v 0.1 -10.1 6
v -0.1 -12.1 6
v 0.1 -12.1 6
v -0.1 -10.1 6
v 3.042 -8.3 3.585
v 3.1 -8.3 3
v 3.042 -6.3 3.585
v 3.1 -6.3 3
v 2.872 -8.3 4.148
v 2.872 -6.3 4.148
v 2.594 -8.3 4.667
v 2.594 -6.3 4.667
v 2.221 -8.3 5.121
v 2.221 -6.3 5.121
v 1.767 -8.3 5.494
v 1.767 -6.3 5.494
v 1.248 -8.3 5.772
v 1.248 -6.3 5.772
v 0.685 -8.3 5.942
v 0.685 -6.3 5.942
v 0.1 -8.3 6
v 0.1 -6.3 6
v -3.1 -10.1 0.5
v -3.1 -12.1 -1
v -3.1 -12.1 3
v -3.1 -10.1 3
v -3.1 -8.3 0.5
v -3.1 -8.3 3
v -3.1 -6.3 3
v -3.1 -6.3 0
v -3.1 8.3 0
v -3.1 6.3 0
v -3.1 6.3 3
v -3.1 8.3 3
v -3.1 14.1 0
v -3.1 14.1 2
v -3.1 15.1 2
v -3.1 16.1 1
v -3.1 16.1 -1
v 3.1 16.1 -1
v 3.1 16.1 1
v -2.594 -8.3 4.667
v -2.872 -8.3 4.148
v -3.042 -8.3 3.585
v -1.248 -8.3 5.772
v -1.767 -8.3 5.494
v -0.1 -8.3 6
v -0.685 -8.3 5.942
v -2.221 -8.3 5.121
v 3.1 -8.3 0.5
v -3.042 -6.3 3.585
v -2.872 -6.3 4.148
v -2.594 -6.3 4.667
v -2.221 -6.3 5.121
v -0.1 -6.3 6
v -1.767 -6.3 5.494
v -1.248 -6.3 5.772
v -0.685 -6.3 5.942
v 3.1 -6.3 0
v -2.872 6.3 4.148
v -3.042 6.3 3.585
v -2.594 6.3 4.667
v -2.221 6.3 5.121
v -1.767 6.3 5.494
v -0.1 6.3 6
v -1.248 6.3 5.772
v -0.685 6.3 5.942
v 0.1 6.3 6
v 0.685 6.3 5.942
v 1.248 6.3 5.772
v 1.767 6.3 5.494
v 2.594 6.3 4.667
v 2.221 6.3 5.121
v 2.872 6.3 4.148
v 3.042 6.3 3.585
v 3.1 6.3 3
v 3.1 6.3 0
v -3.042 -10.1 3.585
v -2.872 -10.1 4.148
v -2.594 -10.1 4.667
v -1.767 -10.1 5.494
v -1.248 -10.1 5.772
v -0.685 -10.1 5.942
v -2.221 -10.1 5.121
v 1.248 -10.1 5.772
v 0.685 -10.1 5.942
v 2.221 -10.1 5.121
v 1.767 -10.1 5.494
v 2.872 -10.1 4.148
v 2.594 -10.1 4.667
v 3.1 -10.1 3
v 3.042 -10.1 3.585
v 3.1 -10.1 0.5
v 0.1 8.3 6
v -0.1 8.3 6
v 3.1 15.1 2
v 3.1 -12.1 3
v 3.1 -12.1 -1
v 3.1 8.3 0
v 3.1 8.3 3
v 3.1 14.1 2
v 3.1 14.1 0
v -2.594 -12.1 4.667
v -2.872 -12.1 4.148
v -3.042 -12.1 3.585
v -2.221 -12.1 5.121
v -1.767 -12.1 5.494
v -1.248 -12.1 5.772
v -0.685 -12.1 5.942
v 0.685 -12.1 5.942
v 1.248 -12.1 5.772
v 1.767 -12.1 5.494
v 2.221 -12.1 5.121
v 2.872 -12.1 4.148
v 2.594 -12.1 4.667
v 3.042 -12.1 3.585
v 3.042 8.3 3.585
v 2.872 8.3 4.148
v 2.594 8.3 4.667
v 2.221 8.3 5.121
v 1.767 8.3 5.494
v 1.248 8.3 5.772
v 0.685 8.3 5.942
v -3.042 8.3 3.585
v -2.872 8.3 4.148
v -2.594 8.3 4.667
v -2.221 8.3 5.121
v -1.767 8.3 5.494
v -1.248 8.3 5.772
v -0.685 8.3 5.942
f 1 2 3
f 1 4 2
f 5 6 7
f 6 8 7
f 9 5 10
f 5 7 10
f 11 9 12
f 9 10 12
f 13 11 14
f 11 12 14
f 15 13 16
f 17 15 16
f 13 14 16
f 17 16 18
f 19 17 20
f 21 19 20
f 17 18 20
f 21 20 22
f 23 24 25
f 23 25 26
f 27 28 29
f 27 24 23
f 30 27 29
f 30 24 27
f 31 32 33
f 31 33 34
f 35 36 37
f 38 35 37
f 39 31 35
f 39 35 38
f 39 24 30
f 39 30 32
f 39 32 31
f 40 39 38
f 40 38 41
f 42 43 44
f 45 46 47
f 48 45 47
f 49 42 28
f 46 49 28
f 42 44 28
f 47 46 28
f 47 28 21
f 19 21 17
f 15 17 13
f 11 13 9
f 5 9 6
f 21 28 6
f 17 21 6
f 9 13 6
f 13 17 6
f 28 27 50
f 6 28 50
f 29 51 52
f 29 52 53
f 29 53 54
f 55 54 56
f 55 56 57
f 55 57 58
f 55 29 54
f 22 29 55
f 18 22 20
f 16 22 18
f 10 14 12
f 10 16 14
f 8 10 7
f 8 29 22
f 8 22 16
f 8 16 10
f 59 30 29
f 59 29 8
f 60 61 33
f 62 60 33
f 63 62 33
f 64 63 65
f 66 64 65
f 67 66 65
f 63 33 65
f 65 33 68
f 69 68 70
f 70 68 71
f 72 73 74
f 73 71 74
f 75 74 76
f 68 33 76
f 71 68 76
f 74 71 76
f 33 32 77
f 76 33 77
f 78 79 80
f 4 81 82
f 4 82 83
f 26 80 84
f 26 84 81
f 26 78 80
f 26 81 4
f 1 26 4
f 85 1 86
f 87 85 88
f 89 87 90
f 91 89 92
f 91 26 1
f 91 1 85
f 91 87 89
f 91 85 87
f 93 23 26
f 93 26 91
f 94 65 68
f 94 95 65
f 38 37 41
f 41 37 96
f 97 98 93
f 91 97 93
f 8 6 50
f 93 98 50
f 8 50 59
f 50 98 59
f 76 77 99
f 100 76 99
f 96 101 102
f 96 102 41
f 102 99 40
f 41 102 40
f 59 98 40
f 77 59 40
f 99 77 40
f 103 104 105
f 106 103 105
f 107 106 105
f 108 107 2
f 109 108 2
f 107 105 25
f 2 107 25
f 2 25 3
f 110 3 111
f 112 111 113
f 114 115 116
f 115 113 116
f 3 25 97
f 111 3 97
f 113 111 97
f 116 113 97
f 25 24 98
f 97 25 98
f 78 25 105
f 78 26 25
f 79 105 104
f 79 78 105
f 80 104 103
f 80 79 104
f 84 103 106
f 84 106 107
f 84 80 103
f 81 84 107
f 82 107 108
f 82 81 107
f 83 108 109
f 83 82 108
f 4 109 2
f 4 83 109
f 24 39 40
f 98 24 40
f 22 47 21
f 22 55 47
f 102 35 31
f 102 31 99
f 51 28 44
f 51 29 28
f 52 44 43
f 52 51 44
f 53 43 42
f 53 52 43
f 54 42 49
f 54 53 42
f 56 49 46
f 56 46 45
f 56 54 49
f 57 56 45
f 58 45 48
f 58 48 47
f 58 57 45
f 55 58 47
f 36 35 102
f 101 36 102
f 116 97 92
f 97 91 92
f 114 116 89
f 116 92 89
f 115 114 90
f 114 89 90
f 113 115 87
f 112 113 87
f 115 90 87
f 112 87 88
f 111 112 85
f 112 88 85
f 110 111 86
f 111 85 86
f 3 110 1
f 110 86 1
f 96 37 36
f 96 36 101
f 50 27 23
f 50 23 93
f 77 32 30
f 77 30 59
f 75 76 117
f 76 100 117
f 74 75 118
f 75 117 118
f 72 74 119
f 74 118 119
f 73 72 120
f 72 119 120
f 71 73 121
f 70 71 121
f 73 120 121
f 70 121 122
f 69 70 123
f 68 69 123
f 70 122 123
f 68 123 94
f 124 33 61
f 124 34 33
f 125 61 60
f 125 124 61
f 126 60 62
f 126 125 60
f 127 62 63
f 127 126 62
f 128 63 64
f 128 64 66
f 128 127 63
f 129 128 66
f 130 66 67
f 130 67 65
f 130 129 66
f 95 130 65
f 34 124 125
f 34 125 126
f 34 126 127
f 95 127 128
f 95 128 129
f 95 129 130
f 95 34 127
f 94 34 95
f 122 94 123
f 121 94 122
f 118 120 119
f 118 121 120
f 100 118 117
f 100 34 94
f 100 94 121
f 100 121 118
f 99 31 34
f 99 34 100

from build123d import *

# Parameters (mm, degrees)
F0_W     = 6.2
F0_H     = 2
F0_H_2   = 12.6
F0_H_3   = 1.8
F0_H_4   = 5.8
F1_DEPTH = 1
F2_DEPTH = 6
F3_R     = 3
F4_DEPTH = 0.5
F5_DEPTH = 2
F6_SIZE  = 1


with BuildPart() as f1:
    # F0 (on Top) → F1 (new body)
    with BuildSketch(Plane.XY):
        with Locations((0, 15.1)):
            Rectangle(F0_W, F0_H)
        with Locations((0, -11.1)):
            Rectangle(F0_W, F0_H)
        Rectangle(F0_W, F0_H_2)
        with Locations((0, -7.3)):
            Rectangle(F0_W, F0_H)
        with Locations((0, -9.2)):
            Rectangle(F0_W, F0_H_3)
        with Locations((0, 7.3)):
            Rectangle(F0_W, F0_H)
        with Locations((0, 11.2)):
            Rectangle(F0_W, F0_H_4)
    extrude(amount=-F1_DEPTH)

    # F0 (on Top) → F2 (join)
    with BuildSketch(Plane.XY):
        with Locations((0, 7.3)):
            Rectangle(F0_W, F0_H)
        with Locations((0, -7.3)):
            Rectangle(F0_W, F0_H)
        with Locations((0, -11.1)):
            Rectangle(F0_W, F0_H)
    extrude(amount=F2_DEPTH)

    # F3
    f3_edges = [f1.edges().sort_by_distance(p)[0] for p in [
        (-3.1, 7.3, 6),
        (-3.1, -7.3, 6),
        (-3.1, -11.1, 6),
        (3.1, 7.3, 6),
        (3.1, -7.3, 6),
        (3.1, -11.1, 6),
    ]]
    fillet(f3_edges, radius=F3_R)

    # F0 (on Top) → F4 (join)
    with BuildSketch(Plane.XY):
        with Locations((0, -9.2)):
            Rectangle(F0_W, F0_H_3)
    extrude(amount=F4_DEPTH)

    # F0 (on Top) → F5 (join)
    with BuildSketch(Plane.XY):
        with Locations((0, 15.1)):
            Rectangle(F0_W, F0_H)
    extrude(amount=F5_DEPTH)

    # F6
    f6_edges = [f1.edges().sort_by_distance(p)[0] for p in [
        (0, 16.1, 2),
    ]]
    chamfer(f6_edges, length=F6_SIZE)


solid = f1.part
